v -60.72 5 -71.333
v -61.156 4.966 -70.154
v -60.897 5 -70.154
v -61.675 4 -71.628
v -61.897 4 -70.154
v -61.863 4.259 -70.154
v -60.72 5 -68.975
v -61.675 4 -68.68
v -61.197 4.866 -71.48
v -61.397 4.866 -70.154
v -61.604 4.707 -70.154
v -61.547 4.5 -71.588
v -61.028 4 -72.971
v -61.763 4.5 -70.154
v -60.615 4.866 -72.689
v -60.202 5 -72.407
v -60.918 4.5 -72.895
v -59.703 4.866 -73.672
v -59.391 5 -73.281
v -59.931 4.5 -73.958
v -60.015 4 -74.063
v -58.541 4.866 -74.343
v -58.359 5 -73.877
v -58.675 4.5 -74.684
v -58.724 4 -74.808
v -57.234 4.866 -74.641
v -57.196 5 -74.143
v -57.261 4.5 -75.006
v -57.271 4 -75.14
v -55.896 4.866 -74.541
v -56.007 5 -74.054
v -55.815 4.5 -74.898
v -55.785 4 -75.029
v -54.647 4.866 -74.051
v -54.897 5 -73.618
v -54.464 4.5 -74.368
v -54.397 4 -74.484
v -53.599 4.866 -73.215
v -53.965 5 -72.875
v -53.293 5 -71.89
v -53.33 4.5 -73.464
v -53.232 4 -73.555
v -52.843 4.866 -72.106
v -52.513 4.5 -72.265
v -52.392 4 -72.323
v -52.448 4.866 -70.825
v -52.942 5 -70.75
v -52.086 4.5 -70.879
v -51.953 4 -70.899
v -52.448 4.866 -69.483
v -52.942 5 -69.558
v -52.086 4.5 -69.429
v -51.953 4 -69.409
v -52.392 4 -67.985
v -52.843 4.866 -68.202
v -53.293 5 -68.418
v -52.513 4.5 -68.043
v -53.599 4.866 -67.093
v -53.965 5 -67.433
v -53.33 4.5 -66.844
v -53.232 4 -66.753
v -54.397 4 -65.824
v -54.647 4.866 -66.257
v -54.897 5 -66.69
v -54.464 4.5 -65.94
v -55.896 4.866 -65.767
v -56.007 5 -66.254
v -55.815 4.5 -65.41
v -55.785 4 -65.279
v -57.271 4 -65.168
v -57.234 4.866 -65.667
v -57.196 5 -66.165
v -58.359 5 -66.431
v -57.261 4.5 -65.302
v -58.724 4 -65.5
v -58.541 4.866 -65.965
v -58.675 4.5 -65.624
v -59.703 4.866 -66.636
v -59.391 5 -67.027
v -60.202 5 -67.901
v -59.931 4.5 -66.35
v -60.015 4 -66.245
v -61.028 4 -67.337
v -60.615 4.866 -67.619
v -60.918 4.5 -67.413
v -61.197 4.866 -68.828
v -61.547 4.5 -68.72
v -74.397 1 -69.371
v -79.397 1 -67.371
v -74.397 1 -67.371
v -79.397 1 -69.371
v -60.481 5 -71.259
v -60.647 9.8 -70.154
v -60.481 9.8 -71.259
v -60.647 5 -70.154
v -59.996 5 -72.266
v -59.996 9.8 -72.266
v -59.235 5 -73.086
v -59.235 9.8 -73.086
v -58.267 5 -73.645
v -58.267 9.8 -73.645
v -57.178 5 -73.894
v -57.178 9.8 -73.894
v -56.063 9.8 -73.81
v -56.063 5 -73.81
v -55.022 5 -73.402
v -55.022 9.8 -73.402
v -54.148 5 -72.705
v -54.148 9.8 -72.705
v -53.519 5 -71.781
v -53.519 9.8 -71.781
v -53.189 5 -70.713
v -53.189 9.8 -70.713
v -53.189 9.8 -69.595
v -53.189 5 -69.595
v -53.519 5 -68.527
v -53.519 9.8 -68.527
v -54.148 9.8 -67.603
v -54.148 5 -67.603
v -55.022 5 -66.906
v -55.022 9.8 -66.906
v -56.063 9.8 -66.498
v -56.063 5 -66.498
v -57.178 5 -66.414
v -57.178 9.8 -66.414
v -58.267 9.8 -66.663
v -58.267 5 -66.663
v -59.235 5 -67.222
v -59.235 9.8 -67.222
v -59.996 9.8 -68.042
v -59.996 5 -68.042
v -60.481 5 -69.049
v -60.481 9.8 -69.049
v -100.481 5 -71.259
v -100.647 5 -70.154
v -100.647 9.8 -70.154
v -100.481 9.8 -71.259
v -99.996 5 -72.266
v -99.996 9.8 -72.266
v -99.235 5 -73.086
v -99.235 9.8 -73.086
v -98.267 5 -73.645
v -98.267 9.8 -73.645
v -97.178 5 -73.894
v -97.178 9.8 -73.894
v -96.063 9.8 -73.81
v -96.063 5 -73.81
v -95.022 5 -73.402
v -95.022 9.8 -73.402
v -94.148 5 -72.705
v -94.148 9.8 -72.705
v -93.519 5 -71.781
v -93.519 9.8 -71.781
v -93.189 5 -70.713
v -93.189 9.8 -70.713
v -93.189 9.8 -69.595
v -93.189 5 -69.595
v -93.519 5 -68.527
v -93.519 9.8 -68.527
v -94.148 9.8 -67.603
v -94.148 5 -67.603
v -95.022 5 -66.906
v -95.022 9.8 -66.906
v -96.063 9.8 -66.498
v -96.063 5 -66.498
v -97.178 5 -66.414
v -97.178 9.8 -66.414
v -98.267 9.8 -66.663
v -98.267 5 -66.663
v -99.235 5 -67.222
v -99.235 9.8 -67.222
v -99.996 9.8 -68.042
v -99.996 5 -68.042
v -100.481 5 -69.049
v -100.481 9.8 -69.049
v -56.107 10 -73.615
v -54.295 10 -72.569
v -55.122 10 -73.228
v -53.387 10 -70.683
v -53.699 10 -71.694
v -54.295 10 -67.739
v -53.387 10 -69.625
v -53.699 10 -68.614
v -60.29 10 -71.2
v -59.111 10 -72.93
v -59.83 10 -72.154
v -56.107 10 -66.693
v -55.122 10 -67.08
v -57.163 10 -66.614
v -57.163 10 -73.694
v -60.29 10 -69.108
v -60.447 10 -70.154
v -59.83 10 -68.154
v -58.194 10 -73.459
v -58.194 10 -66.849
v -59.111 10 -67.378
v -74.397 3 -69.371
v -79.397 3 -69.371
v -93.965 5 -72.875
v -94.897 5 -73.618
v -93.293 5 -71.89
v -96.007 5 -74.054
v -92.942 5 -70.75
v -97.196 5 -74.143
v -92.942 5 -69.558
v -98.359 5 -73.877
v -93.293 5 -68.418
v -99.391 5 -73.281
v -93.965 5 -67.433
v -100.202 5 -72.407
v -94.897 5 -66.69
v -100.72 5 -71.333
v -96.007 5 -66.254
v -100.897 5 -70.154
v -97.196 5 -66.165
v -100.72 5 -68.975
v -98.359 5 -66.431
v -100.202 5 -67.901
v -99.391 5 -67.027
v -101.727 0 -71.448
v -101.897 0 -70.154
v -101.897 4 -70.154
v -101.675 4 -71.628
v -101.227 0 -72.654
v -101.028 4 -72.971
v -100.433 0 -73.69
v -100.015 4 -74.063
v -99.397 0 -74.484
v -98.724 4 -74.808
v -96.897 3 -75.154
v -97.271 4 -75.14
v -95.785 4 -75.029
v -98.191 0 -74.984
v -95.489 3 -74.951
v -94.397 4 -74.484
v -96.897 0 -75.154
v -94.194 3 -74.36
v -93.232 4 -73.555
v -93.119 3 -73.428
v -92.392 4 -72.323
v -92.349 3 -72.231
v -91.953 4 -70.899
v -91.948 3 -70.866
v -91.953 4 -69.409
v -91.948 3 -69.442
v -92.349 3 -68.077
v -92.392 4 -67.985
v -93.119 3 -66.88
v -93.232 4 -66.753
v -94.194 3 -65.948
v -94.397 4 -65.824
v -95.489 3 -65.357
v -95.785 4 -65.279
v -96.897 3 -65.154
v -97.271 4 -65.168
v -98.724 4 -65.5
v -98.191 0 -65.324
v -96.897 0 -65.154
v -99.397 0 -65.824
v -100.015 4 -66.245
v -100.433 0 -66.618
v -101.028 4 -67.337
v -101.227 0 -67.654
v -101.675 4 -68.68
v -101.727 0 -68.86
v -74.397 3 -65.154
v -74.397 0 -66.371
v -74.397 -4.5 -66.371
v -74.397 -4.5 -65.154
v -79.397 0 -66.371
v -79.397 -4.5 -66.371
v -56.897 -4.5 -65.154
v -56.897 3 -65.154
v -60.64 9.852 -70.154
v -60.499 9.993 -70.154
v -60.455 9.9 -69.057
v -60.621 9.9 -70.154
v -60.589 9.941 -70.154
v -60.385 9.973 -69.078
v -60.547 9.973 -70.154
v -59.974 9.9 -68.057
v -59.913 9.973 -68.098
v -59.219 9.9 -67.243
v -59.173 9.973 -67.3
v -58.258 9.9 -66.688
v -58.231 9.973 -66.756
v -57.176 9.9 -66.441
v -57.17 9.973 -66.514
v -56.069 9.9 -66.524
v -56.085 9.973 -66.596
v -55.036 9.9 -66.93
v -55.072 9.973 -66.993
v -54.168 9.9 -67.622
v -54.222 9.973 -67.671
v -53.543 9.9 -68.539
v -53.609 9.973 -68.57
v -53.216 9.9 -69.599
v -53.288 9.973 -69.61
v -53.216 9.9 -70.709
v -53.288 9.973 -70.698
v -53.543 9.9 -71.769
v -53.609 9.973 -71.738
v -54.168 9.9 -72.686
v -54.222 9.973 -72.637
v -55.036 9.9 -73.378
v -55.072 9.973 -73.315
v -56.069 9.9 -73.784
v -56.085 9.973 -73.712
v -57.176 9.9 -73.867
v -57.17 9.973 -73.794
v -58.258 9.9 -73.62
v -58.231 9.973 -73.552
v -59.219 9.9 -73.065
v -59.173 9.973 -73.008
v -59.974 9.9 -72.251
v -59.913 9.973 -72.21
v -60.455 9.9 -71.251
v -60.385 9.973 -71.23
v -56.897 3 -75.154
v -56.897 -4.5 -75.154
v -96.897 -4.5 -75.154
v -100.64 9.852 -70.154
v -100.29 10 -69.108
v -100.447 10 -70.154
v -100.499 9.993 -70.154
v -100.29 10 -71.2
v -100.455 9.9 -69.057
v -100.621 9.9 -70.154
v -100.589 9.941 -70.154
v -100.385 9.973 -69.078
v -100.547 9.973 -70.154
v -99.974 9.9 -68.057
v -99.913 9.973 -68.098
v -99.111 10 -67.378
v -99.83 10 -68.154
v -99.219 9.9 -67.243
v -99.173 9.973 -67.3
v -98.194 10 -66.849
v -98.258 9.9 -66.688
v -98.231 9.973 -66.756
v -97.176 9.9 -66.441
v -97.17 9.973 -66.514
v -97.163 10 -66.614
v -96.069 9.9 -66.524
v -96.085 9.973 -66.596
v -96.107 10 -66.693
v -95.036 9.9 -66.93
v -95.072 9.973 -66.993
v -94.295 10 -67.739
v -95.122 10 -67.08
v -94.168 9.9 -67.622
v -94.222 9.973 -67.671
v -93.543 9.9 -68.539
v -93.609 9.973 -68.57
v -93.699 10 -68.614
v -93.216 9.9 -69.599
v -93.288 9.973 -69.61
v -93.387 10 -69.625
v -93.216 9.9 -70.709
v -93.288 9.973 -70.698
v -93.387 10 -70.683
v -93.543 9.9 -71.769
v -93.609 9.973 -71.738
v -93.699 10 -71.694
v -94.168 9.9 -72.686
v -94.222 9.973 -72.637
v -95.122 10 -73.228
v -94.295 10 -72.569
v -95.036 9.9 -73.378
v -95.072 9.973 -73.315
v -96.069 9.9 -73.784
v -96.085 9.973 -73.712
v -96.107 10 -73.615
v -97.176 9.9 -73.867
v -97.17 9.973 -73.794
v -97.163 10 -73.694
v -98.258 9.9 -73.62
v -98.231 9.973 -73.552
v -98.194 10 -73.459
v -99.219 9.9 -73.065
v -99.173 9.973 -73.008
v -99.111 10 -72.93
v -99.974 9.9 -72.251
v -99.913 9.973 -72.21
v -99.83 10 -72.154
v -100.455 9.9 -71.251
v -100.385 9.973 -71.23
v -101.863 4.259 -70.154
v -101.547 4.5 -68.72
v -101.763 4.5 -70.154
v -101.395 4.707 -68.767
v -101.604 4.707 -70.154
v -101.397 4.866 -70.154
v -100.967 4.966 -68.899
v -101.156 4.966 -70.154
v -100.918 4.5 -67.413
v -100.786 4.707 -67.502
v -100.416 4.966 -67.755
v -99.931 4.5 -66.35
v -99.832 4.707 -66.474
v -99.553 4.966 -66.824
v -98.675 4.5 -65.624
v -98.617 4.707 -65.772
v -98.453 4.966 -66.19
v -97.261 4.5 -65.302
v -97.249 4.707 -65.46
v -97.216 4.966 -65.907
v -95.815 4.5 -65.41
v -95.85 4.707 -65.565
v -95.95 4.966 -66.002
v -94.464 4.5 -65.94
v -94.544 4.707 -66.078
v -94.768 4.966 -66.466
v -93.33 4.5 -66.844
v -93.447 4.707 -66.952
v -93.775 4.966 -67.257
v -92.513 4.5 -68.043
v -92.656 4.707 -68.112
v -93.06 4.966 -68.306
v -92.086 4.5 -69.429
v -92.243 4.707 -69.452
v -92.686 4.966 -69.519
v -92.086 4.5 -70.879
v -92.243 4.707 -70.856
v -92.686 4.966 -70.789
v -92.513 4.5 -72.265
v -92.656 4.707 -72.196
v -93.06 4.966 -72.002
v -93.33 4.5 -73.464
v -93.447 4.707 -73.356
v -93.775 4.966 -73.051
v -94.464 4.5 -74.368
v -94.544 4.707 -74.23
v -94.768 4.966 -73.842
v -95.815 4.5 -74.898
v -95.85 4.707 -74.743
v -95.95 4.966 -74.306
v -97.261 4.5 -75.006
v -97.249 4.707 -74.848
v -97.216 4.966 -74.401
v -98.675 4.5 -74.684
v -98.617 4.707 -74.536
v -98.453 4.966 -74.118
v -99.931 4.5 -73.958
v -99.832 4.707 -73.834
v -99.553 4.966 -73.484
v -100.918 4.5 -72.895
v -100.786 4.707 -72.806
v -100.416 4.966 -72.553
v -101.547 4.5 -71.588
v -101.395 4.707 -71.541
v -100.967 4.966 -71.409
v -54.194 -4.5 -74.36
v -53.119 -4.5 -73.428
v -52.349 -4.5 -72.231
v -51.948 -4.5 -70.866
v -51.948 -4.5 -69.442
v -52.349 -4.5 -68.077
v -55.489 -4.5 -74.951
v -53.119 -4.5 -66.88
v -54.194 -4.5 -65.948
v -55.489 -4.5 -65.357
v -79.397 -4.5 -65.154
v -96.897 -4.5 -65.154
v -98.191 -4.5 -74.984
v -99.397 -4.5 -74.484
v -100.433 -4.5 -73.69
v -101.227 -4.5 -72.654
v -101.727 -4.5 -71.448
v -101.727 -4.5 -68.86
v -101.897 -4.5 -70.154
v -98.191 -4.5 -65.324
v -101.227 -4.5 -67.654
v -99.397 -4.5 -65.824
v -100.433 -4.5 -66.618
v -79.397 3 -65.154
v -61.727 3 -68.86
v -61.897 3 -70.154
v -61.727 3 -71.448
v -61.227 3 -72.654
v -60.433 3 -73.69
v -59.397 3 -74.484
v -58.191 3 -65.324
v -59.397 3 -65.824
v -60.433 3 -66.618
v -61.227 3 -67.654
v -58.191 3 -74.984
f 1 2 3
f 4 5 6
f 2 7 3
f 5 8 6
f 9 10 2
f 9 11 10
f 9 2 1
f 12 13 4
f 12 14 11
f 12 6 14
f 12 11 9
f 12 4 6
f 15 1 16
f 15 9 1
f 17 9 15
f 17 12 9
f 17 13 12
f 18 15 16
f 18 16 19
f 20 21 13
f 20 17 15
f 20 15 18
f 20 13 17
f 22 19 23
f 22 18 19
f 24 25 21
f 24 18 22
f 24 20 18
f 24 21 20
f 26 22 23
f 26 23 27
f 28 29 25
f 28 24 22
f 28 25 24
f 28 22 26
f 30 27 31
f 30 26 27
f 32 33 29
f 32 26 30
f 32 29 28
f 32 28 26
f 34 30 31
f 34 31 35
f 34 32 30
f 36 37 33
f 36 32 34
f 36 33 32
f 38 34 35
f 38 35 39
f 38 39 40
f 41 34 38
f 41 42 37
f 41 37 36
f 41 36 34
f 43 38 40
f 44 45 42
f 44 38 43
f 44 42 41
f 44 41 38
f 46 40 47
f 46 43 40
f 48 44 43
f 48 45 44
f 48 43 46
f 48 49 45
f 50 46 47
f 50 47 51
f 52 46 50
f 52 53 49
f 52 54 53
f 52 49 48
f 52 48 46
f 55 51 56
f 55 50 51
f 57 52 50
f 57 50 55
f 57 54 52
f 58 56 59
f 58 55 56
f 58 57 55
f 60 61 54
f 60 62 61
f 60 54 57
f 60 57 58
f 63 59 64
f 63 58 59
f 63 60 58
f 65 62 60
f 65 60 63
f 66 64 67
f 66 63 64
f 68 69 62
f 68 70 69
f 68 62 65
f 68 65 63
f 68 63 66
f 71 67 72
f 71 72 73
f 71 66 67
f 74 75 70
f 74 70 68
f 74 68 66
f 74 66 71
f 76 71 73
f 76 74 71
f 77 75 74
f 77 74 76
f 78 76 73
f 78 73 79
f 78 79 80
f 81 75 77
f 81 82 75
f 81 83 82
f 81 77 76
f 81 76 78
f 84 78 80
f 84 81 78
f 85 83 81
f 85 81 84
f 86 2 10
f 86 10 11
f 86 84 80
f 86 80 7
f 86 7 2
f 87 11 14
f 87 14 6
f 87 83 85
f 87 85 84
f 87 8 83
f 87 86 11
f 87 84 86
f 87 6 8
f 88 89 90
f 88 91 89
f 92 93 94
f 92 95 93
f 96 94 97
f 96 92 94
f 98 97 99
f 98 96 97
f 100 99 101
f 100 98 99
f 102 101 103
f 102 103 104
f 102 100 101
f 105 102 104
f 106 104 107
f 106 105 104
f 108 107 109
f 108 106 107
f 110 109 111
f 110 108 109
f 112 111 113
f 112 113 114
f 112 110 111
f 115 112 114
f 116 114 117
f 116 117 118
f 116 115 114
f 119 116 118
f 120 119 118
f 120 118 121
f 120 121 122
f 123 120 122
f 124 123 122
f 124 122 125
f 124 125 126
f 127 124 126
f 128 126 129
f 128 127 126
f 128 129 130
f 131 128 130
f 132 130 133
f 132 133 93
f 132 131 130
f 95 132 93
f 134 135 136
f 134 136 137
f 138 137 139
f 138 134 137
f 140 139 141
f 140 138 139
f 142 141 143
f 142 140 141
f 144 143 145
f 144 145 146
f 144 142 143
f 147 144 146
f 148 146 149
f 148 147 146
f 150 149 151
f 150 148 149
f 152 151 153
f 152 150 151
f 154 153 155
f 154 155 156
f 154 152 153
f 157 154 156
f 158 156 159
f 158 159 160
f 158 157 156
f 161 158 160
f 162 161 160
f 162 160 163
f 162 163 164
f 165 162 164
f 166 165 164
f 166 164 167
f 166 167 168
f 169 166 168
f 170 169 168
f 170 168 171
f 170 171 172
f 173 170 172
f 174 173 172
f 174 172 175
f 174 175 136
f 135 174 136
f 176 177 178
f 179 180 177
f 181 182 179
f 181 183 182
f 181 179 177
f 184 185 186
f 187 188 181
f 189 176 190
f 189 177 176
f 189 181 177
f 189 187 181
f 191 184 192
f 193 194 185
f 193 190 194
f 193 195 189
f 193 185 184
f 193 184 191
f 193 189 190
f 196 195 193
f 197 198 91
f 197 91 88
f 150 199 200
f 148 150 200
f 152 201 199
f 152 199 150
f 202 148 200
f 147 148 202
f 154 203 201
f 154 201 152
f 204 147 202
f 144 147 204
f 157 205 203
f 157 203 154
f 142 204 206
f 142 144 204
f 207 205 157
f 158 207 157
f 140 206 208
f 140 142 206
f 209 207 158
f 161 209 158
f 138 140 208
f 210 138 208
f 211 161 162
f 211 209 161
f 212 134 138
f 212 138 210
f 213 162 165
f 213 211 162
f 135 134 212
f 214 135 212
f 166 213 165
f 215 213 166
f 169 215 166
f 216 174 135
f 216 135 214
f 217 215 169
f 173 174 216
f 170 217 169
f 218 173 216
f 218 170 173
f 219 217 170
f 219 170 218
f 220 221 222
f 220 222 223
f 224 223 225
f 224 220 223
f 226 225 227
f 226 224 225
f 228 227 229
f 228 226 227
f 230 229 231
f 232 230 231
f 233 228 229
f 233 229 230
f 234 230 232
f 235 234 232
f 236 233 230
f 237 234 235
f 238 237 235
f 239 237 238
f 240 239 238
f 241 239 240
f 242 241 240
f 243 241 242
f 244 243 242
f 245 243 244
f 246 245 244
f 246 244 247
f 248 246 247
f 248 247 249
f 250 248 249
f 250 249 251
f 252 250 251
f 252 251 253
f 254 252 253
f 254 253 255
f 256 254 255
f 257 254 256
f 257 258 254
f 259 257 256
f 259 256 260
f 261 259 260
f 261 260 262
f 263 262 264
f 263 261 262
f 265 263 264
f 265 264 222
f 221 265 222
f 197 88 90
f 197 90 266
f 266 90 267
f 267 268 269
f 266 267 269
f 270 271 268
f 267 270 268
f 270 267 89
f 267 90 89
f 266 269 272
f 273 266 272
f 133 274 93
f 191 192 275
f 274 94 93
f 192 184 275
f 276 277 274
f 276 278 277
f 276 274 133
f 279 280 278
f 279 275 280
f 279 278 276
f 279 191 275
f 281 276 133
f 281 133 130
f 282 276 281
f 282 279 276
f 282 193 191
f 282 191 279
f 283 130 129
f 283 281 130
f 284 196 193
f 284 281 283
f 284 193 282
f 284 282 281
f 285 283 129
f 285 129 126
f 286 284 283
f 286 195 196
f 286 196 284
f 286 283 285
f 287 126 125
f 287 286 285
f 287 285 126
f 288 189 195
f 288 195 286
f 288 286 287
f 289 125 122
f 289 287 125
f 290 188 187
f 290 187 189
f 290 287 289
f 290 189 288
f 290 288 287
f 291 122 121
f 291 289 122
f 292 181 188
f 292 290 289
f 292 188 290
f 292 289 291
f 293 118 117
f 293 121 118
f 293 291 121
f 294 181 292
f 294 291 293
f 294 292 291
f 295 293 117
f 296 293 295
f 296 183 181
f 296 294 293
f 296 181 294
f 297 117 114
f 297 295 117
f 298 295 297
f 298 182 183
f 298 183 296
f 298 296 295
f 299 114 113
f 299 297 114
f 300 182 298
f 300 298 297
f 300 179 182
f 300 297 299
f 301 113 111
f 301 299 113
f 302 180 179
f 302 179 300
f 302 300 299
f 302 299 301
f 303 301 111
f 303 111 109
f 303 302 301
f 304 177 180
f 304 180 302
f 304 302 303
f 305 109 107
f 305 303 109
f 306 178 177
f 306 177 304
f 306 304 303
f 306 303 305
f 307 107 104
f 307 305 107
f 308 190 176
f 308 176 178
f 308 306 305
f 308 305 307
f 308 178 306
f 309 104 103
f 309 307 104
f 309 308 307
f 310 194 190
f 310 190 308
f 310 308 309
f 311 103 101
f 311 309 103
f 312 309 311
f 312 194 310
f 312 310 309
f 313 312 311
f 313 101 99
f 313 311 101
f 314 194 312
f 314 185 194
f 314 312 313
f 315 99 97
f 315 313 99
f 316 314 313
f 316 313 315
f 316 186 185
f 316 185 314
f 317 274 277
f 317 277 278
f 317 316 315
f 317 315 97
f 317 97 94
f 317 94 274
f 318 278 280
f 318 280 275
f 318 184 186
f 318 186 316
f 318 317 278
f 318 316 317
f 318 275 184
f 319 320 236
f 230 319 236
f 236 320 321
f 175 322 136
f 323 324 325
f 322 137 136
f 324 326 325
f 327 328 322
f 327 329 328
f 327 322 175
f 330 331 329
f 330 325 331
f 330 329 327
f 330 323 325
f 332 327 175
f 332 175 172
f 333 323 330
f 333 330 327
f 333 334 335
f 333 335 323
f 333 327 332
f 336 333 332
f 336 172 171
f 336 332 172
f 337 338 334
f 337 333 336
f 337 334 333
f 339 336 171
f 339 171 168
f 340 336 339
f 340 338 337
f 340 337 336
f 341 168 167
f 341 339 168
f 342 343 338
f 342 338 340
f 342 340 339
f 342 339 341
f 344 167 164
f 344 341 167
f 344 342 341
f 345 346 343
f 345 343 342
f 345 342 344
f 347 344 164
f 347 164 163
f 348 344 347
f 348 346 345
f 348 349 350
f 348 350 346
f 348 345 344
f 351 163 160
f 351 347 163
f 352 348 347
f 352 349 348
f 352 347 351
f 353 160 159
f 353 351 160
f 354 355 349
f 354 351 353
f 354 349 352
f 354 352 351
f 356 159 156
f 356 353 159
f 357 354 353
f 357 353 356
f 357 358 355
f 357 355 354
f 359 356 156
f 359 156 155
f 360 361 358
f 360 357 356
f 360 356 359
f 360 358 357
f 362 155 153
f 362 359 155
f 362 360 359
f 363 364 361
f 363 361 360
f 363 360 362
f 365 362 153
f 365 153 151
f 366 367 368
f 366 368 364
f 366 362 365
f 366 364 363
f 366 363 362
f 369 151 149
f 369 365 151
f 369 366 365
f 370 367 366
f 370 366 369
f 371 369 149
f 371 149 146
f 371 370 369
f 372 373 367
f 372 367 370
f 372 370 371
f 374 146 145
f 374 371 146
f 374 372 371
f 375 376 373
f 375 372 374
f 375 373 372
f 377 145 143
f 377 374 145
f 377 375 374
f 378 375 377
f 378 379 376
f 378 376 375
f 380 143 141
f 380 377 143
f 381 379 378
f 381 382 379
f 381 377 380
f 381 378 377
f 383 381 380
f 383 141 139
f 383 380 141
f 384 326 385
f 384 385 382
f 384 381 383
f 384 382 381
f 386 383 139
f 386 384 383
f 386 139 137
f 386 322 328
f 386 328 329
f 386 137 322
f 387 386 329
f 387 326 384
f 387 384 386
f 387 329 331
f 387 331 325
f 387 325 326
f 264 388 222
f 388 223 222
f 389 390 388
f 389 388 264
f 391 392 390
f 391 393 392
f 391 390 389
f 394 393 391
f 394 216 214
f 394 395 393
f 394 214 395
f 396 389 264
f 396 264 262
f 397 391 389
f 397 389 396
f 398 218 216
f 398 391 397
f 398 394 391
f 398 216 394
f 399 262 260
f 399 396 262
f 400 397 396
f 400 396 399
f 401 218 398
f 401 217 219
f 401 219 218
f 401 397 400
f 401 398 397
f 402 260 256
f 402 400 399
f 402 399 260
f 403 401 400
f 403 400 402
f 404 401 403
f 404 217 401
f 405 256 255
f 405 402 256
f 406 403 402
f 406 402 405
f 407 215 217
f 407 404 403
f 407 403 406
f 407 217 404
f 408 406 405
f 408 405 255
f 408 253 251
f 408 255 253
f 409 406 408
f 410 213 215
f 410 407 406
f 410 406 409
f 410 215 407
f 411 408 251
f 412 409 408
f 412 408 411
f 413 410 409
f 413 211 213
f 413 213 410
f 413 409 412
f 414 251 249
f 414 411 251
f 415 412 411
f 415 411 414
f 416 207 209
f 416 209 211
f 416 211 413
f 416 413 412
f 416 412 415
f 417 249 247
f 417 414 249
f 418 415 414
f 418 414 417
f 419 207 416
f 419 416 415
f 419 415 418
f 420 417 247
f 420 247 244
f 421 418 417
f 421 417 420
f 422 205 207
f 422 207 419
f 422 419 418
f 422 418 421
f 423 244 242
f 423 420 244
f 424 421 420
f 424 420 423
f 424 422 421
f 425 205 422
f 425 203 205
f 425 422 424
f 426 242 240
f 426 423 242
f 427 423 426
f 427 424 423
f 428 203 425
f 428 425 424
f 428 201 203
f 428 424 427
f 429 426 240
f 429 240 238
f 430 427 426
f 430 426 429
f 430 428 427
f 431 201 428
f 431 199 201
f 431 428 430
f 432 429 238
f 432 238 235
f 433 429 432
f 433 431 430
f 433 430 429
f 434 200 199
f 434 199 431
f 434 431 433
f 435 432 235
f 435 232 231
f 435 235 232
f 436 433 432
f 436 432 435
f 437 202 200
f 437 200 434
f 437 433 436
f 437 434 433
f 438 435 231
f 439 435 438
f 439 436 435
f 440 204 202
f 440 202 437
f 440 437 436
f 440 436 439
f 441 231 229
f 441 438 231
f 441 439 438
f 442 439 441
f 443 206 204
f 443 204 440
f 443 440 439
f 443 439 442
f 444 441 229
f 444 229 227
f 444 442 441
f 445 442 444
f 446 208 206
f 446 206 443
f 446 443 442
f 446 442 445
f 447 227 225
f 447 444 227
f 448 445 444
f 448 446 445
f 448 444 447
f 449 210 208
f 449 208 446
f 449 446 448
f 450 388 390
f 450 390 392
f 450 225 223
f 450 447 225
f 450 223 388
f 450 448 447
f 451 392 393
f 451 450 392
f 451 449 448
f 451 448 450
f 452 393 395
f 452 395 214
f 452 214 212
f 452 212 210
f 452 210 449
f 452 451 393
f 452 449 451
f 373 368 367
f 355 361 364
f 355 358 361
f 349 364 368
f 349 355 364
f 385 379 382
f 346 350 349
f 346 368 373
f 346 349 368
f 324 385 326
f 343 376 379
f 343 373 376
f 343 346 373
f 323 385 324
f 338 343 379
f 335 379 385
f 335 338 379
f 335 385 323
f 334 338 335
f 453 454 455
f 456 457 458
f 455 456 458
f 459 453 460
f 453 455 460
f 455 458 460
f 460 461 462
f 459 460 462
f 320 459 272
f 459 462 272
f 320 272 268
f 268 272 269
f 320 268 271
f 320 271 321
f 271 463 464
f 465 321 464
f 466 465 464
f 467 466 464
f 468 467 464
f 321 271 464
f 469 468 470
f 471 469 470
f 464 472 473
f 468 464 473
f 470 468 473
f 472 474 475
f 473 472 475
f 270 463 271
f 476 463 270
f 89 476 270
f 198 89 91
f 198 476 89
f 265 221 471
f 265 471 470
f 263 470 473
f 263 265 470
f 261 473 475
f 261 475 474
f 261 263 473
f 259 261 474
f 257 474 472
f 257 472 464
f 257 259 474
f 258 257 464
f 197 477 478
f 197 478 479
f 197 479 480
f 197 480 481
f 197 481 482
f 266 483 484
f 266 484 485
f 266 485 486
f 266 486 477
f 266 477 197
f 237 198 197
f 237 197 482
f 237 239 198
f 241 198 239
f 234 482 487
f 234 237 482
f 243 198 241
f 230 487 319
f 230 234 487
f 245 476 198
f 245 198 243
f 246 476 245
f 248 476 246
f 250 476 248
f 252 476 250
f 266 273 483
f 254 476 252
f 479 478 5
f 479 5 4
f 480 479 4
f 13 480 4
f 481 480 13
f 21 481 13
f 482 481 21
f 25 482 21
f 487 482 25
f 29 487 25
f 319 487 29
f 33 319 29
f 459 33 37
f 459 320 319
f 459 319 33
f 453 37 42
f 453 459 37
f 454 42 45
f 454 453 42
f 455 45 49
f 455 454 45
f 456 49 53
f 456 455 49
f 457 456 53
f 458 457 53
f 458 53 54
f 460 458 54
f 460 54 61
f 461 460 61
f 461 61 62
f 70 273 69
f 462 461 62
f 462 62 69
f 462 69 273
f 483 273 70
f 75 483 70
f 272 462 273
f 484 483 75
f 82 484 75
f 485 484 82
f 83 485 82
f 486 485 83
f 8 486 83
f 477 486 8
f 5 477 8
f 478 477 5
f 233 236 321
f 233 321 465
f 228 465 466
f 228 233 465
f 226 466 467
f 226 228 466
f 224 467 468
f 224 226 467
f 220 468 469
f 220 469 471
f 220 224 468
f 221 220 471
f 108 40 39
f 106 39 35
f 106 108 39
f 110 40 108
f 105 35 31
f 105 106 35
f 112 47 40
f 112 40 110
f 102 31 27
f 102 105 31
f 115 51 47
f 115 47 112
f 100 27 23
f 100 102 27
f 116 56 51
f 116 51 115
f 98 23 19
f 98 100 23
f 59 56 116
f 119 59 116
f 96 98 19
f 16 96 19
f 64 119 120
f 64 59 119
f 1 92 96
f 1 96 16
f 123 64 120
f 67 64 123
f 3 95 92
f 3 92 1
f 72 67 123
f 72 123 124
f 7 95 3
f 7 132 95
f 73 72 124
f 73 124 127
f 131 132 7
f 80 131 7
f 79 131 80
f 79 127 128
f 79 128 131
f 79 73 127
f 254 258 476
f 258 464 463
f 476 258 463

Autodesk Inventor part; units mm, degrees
ref_plane "YZ Plane" through (0, 0, 0) normal (1, 0, 0) x (0, 1, 0)
ref_plane "XZ Plane" through (0, 0, 0) normal (0, 1, 0) x (-1, 0, 0)
ref_plane "XY Plane" through (0, 0, 0) normal (0, 0, 1) x (1, 0, 0)
sketch "Skizze1" plane through (0, 0, 0) normal (0, 1, 0) x (-1, 0, 0)
  line L0 (96.8973, -70.154) -> (56.8973, -70.154)
  circle A0 centre (56.8973, -70.154) radius 5
  circle A1 centre (96.8973, -70.154) radius 5
  circle A2 centre (96.8973, -70.154) radius 3.75
  circle A3 centre (56.8973, -70.154) radius 3.75
  line L1 (96.8973, -65.154) -> (56.8973, -65.154)
  line L2 (56.8973, -65.154) -> (56.8973, -75.154)
  line L3 (56.8973, -75.154) -> (96.8973, -75.154)
  line L4 (96.8973, -75.154) -> (96.8973, -65.154)
  dimension "d8" = 10
  dimension "d11" = 10
  dimension "d12" = 7.5
  dimension "d15" = 7.5
  dimension "d18" = 40
extrude "Extrusion1" add sketch "Skizze1" along normal blind 10 contours A3 L2 L0 | L0 L2 A3 | L2 A3 | A2 L4 L0 | L0 L4 A2 | L4 A2
extrude "Extrusion2" add sketch "Skizze1" along normal blind 5 contours A0 L2 A3 L0 | L0 A3 L2 A0 | A1 L4 A2 L0 | L0 A2 L4 A1 | L2 A3 A0 | A1 L4 A2
extrude "Extrusion3" add sketch "Skizze1" along normal blind 3 and the other way blind 4.5 contours A0 L2 A3 L0 | A0 L1 A1 L0 | L0 A3 L2 A0 | L0 A1 L3 A0 | A3 L2 L0 | L0 L2 A3 | A1 L4 A2 L0 | L0 A2 L4 A1 | A2 L4 L0 | L0 L4 A2
fillet "Rundung1" radius 1 2 edges at (-51.8973, 5, -70.154) (-91.8973, 5, -70.154)
fillet "Rundung2" radius 0.2 2 edges at (-53.1473, 10, -70.154) (-93.1473, 10, -70.154)
extrude "Extrusion4" add sketch "Skizze1" against normal blind 4.5 contours A0 L2 A3 L0 | L0 A3 L2 A0 | A3 L2 L0 | L0 L2 A3 | A1 L4 A2 L0 | L0 A2 L4 A1 | L2 A3 A0 | L2 A3 | A2 L4 L0 | L0 L4 A2 | A1 L4 A2 | L4 A2
sketch "Skizze2" plane through (0, -4.5, 0) normal (0, -1, 0) x (1, 0, 0)
  line L0 (-96.8973, -65.154) -> (-56.8973, -65.154) projected
  line L1 (-74.3973, -65.154) -> (-79.3973, -65.154)
  line L2 (-79.3973, -65.154) -> (-79.3973, -66.3709)
  line L3 (-79.3973, -66.3709) -> (-74.3973, -66.3709)
  line L4 (-74.3973, -66.3709) -> (-74.3973, -65.154)
  point P0 (0, 0)
  dimension "d31" = 5
  dimension "d32" = 17.5
extrude "Extrusion5" cut sketch "Skizze2" against normal blind 10
sketch "Skizze3" plane through (0, 3, 0) normal (0, 1, 0) x (1, 0, 0)
  line L0 (-74.3973, 66.3709) -> (-79.3973, 66.3709) projected
  line L1 (-74.3973, 66.3709) -> (-79.3973, 66.3709)
  line L2 (-79.3973, 66.3709) -> (-79.3973, 69.3709)
  line L3 (-79.3973, 69.3709) -> (-74.3973, 69.3709)
  line L4 (-74.3973, 69.3709) -> (-74.3973, 66.3709)
  point P0 (0, 0)
  dimension "d35" = 3
extrude "Extrusion6" cut sketch "Skizze3" against normal blind 2
chamfer "Fase1" distance 1 angle 45 1 edges at (-76.8973, 1, -66.3709)
properties part number "2er-Stecker"
